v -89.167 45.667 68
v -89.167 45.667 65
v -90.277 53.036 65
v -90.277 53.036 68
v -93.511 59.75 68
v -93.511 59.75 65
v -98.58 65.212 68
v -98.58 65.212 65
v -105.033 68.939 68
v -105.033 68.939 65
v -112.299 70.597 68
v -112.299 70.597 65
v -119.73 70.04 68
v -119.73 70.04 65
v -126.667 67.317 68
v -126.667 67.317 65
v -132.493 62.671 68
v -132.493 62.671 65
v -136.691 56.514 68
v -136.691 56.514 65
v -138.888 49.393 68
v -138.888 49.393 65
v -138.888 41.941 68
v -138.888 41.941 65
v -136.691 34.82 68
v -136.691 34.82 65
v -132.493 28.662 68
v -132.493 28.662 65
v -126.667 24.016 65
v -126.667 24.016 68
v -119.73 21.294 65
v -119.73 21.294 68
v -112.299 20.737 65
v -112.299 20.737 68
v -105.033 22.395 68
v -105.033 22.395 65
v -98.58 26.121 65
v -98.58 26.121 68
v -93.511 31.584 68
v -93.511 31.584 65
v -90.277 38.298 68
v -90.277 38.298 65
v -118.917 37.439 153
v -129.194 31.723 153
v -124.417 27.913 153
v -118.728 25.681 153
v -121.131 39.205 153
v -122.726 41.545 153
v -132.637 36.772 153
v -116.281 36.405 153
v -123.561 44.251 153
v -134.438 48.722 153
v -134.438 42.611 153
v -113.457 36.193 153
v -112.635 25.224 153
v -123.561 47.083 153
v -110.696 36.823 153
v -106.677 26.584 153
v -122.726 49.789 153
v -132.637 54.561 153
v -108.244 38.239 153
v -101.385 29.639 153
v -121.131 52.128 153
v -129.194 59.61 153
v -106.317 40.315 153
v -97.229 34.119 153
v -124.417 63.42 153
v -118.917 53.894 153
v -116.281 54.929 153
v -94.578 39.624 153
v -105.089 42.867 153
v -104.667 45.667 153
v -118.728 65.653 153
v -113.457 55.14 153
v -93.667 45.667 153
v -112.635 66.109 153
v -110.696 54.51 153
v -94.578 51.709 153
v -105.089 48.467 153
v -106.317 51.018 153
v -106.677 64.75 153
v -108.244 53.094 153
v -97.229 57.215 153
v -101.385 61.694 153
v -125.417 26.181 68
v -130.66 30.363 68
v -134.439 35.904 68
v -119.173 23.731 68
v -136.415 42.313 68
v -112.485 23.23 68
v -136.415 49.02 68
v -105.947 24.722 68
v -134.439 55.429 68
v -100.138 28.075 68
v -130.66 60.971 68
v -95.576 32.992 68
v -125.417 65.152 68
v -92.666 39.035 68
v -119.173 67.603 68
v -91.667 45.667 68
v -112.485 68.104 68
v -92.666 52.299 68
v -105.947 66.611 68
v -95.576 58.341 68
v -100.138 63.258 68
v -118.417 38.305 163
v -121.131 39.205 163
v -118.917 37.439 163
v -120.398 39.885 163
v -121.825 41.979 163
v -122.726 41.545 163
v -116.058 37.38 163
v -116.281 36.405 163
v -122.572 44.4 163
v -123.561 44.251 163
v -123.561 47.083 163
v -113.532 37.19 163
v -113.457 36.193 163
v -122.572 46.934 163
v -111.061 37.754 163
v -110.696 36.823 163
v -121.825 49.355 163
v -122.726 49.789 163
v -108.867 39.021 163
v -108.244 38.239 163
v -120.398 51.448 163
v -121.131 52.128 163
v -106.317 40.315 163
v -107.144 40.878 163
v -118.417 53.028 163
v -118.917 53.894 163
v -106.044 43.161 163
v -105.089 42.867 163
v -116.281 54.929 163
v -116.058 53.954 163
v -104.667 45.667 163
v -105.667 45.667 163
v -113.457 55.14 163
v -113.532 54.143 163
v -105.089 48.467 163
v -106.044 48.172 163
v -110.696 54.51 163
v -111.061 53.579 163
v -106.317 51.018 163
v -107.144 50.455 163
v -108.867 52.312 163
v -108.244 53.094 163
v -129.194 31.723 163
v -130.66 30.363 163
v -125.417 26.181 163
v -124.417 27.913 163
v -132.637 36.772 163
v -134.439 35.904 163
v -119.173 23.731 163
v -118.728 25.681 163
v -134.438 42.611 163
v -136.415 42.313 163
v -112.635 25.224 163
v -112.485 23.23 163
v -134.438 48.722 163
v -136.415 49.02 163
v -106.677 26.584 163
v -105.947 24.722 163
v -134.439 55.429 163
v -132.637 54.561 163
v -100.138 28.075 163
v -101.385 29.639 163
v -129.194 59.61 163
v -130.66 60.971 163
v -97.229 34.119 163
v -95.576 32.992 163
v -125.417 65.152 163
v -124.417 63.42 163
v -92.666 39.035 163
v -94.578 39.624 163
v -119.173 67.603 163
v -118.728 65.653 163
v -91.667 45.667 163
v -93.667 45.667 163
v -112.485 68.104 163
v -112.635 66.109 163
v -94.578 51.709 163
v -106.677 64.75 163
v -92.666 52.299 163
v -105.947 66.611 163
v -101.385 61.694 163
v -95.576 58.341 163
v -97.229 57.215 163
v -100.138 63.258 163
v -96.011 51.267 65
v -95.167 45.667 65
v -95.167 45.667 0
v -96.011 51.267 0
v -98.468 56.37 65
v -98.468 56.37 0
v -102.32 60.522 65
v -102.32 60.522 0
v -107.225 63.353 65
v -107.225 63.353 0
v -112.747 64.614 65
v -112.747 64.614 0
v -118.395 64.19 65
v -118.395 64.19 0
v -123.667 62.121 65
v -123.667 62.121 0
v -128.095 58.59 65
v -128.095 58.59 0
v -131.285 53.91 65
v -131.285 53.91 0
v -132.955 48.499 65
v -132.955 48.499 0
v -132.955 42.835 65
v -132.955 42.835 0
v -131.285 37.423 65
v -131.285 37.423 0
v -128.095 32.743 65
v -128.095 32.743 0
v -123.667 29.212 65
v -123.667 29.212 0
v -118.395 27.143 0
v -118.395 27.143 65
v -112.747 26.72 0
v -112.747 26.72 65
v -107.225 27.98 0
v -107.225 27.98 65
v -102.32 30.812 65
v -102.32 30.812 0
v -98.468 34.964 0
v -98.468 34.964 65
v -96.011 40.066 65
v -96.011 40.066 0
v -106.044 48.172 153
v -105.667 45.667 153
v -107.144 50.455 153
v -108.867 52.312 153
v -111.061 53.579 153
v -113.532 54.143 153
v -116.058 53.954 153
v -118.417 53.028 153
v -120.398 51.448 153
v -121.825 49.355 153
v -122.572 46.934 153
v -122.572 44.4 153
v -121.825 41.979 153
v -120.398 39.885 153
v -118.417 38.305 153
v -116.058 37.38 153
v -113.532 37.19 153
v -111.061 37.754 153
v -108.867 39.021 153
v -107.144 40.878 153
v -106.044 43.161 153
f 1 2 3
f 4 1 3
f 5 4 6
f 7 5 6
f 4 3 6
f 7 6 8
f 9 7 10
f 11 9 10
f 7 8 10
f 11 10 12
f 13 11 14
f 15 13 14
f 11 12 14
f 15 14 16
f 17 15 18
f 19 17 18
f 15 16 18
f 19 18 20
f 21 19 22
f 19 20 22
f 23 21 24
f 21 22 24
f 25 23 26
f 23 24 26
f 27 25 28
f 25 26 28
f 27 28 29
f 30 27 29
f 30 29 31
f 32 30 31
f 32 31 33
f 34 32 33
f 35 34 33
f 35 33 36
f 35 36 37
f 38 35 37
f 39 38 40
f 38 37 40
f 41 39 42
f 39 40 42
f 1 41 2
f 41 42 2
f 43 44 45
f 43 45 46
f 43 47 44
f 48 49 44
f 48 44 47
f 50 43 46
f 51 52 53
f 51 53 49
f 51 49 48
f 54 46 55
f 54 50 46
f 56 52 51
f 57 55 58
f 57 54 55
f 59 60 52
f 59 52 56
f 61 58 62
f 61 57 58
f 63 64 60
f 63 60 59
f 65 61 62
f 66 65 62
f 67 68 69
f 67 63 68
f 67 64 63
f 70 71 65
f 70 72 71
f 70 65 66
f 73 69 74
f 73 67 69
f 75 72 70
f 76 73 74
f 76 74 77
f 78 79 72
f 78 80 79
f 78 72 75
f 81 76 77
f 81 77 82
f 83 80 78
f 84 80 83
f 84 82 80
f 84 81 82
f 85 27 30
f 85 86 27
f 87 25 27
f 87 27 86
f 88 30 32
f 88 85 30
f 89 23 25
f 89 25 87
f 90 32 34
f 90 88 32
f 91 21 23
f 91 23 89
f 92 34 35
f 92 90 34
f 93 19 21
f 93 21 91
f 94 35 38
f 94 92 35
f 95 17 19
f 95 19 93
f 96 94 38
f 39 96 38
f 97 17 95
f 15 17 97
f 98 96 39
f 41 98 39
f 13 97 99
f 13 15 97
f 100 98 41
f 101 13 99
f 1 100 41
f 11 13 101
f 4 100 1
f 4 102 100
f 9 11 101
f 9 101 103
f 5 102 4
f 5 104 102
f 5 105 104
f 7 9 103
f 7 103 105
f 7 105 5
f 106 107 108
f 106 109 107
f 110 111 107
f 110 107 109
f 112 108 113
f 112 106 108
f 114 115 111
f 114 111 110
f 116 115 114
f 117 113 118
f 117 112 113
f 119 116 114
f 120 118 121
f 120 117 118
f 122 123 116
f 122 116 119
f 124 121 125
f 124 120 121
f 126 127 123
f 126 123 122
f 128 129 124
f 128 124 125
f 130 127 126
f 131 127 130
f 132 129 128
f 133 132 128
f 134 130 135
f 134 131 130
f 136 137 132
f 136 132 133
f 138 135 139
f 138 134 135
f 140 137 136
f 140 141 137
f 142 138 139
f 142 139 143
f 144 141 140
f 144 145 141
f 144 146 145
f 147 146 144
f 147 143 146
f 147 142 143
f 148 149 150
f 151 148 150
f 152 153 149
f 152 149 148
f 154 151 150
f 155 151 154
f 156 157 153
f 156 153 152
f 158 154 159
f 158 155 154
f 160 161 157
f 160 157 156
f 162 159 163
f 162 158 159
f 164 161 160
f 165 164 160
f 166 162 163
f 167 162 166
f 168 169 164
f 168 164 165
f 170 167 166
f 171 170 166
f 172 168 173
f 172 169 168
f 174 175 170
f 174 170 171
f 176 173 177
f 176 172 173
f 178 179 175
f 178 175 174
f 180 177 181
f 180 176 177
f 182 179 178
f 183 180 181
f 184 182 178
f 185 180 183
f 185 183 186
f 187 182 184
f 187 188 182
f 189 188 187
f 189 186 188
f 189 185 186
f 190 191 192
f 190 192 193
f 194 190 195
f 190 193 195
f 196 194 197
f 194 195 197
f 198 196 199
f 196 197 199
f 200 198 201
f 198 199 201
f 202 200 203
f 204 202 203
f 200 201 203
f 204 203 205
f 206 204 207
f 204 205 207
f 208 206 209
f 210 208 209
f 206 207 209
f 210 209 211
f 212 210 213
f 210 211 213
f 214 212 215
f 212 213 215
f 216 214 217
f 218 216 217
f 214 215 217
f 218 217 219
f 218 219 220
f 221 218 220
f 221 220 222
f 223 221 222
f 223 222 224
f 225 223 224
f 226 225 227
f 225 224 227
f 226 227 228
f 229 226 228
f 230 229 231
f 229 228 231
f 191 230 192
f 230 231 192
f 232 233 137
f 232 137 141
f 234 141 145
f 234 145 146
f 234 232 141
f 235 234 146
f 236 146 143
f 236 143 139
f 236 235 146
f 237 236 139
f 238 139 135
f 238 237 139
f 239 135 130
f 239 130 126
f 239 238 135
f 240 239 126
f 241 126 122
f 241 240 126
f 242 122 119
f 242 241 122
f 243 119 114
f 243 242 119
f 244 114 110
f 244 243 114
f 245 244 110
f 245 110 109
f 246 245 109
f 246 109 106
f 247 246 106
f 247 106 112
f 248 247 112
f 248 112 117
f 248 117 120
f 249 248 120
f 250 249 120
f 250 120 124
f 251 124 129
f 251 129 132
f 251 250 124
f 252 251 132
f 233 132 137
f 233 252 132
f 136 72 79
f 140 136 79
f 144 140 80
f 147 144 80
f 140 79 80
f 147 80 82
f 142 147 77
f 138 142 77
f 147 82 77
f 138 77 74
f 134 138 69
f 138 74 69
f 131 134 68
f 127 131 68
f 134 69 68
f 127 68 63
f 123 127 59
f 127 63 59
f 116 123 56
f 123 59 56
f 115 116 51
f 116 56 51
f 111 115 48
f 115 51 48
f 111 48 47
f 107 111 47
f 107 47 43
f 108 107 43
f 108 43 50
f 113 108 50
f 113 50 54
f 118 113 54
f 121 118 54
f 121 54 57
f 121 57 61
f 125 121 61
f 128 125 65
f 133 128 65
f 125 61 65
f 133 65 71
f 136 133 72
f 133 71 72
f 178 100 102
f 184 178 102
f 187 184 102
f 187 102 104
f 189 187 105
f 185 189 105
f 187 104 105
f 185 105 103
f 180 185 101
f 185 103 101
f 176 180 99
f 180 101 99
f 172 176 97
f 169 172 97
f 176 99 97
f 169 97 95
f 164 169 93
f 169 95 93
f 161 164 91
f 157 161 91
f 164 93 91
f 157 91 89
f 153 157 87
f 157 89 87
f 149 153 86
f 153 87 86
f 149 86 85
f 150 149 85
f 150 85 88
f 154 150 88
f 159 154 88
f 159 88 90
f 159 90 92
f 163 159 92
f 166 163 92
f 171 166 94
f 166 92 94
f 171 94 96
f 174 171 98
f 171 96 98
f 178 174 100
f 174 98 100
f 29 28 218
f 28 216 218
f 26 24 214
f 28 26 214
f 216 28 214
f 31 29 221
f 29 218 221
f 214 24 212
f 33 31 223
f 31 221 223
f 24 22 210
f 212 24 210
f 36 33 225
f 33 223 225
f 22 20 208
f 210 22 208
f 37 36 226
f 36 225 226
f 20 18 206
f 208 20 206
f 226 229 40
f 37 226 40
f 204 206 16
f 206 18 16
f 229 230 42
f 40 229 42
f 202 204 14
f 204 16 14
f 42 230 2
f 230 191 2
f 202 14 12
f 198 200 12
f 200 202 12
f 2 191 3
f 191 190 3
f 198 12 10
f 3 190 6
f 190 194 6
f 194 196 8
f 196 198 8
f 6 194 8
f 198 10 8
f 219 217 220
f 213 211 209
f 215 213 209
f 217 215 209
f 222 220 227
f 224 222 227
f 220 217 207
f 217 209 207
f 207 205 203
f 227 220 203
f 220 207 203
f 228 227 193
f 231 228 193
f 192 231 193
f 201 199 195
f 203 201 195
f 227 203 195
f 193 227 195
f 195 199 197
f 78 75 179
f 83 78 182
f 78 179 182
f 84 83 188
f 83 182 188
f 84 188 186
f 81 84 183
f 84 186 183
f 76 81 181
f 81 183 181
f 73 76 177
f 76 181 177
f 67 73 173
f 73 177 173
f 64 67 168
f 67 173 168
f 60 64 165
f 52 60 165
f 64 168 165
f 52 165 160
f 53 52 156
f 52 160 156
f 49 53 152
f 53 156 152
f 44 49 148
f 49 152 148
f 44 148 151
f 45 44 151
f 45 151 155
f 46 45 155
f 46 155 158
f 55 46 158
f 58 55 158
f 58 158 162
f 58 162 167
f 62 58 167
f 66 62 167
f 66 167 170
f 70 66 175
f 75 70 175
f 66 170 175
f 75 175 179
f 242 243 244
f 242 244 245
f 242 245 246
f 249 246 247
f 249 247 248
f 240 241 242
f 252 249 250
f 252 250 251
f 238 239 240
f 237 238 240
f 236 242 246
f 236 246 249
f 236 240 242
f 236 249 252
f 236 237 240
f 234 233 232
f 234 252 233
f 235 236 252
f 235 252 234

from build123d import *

# Parameters (mm, degrees)
SKETCH1_R           = 19
BOSS_EXTRUDE1_DEPTH = 65
SKETCH2_R           = 25
BOSS_EXTRUDE2_DEPTH = 3
SKETCH3_R           = 22.5
BOSS_EXTRUDE3_DEPTH = 95
SKETCH4_R           = 20.5
CUT_EXTRUDE1_DEPTH  = 10
SKETCH5_R           = 9.5
SKETCH5_R_2         = 8.5
BOSS_EXTRUDE4_DEPTH = 10


with BuildPart() as part:
    # Sketch1 → Boss-Extrude1 (new body)
    with BuildSketch(Plane.XY):
        with Locations((-114.166758924, 45.66670357)):
            Circle(SKETCH1_R)
    extrude(amount=BOSS_EXTRUDE1_DEPTH)

    # Sketch2 → Boss-Extrude2 (add)
    with BuildSketch(Plane.XY.offset(65)):
        with Locations((-114.166758924, 45.66670357)):
            Circle(SKETCH2_R)
    extrude(amount=BOSS_EXTRUDE2_DEPTH)

    # Sketch3 → Boss-Extrude3 (add)
    with BuildSketch(Plane.XY.offset(68)):
        with Locations((-114.166758924, 45.66670357)):
            Circle(SKETCH3_R)
    extrude(amount=BOSS_EXTRUDE3_DEPTH)

    # Sketch4 → Cut-Extrude1 (cut)
    with BuildSketch(Plane.XY.offset(163)):
        with Locations((-114.166758924, 45.66670357)):
            Circle(SKETCH4_R)
    extrude(amount=-CUT_EXTRUDE1_DEPTH, mode=Mode.SUBTRACT)

    # Sketch5 → Boss-Extrude4 (add)
    with BuildSketch(Plane.XY.offset(153)):
        with Locations((-114.166758924, 45.66670357)):
            Circle(SKETCH5_R)
        with Locations((-114.166758924, 45.66670357)):
            Circle(SKETCH5_R_2, mode=Mode.SUBTRACT)
    extrude(amount=BOSS_EXTRUDE4_DEPTH)


solid = part.part
